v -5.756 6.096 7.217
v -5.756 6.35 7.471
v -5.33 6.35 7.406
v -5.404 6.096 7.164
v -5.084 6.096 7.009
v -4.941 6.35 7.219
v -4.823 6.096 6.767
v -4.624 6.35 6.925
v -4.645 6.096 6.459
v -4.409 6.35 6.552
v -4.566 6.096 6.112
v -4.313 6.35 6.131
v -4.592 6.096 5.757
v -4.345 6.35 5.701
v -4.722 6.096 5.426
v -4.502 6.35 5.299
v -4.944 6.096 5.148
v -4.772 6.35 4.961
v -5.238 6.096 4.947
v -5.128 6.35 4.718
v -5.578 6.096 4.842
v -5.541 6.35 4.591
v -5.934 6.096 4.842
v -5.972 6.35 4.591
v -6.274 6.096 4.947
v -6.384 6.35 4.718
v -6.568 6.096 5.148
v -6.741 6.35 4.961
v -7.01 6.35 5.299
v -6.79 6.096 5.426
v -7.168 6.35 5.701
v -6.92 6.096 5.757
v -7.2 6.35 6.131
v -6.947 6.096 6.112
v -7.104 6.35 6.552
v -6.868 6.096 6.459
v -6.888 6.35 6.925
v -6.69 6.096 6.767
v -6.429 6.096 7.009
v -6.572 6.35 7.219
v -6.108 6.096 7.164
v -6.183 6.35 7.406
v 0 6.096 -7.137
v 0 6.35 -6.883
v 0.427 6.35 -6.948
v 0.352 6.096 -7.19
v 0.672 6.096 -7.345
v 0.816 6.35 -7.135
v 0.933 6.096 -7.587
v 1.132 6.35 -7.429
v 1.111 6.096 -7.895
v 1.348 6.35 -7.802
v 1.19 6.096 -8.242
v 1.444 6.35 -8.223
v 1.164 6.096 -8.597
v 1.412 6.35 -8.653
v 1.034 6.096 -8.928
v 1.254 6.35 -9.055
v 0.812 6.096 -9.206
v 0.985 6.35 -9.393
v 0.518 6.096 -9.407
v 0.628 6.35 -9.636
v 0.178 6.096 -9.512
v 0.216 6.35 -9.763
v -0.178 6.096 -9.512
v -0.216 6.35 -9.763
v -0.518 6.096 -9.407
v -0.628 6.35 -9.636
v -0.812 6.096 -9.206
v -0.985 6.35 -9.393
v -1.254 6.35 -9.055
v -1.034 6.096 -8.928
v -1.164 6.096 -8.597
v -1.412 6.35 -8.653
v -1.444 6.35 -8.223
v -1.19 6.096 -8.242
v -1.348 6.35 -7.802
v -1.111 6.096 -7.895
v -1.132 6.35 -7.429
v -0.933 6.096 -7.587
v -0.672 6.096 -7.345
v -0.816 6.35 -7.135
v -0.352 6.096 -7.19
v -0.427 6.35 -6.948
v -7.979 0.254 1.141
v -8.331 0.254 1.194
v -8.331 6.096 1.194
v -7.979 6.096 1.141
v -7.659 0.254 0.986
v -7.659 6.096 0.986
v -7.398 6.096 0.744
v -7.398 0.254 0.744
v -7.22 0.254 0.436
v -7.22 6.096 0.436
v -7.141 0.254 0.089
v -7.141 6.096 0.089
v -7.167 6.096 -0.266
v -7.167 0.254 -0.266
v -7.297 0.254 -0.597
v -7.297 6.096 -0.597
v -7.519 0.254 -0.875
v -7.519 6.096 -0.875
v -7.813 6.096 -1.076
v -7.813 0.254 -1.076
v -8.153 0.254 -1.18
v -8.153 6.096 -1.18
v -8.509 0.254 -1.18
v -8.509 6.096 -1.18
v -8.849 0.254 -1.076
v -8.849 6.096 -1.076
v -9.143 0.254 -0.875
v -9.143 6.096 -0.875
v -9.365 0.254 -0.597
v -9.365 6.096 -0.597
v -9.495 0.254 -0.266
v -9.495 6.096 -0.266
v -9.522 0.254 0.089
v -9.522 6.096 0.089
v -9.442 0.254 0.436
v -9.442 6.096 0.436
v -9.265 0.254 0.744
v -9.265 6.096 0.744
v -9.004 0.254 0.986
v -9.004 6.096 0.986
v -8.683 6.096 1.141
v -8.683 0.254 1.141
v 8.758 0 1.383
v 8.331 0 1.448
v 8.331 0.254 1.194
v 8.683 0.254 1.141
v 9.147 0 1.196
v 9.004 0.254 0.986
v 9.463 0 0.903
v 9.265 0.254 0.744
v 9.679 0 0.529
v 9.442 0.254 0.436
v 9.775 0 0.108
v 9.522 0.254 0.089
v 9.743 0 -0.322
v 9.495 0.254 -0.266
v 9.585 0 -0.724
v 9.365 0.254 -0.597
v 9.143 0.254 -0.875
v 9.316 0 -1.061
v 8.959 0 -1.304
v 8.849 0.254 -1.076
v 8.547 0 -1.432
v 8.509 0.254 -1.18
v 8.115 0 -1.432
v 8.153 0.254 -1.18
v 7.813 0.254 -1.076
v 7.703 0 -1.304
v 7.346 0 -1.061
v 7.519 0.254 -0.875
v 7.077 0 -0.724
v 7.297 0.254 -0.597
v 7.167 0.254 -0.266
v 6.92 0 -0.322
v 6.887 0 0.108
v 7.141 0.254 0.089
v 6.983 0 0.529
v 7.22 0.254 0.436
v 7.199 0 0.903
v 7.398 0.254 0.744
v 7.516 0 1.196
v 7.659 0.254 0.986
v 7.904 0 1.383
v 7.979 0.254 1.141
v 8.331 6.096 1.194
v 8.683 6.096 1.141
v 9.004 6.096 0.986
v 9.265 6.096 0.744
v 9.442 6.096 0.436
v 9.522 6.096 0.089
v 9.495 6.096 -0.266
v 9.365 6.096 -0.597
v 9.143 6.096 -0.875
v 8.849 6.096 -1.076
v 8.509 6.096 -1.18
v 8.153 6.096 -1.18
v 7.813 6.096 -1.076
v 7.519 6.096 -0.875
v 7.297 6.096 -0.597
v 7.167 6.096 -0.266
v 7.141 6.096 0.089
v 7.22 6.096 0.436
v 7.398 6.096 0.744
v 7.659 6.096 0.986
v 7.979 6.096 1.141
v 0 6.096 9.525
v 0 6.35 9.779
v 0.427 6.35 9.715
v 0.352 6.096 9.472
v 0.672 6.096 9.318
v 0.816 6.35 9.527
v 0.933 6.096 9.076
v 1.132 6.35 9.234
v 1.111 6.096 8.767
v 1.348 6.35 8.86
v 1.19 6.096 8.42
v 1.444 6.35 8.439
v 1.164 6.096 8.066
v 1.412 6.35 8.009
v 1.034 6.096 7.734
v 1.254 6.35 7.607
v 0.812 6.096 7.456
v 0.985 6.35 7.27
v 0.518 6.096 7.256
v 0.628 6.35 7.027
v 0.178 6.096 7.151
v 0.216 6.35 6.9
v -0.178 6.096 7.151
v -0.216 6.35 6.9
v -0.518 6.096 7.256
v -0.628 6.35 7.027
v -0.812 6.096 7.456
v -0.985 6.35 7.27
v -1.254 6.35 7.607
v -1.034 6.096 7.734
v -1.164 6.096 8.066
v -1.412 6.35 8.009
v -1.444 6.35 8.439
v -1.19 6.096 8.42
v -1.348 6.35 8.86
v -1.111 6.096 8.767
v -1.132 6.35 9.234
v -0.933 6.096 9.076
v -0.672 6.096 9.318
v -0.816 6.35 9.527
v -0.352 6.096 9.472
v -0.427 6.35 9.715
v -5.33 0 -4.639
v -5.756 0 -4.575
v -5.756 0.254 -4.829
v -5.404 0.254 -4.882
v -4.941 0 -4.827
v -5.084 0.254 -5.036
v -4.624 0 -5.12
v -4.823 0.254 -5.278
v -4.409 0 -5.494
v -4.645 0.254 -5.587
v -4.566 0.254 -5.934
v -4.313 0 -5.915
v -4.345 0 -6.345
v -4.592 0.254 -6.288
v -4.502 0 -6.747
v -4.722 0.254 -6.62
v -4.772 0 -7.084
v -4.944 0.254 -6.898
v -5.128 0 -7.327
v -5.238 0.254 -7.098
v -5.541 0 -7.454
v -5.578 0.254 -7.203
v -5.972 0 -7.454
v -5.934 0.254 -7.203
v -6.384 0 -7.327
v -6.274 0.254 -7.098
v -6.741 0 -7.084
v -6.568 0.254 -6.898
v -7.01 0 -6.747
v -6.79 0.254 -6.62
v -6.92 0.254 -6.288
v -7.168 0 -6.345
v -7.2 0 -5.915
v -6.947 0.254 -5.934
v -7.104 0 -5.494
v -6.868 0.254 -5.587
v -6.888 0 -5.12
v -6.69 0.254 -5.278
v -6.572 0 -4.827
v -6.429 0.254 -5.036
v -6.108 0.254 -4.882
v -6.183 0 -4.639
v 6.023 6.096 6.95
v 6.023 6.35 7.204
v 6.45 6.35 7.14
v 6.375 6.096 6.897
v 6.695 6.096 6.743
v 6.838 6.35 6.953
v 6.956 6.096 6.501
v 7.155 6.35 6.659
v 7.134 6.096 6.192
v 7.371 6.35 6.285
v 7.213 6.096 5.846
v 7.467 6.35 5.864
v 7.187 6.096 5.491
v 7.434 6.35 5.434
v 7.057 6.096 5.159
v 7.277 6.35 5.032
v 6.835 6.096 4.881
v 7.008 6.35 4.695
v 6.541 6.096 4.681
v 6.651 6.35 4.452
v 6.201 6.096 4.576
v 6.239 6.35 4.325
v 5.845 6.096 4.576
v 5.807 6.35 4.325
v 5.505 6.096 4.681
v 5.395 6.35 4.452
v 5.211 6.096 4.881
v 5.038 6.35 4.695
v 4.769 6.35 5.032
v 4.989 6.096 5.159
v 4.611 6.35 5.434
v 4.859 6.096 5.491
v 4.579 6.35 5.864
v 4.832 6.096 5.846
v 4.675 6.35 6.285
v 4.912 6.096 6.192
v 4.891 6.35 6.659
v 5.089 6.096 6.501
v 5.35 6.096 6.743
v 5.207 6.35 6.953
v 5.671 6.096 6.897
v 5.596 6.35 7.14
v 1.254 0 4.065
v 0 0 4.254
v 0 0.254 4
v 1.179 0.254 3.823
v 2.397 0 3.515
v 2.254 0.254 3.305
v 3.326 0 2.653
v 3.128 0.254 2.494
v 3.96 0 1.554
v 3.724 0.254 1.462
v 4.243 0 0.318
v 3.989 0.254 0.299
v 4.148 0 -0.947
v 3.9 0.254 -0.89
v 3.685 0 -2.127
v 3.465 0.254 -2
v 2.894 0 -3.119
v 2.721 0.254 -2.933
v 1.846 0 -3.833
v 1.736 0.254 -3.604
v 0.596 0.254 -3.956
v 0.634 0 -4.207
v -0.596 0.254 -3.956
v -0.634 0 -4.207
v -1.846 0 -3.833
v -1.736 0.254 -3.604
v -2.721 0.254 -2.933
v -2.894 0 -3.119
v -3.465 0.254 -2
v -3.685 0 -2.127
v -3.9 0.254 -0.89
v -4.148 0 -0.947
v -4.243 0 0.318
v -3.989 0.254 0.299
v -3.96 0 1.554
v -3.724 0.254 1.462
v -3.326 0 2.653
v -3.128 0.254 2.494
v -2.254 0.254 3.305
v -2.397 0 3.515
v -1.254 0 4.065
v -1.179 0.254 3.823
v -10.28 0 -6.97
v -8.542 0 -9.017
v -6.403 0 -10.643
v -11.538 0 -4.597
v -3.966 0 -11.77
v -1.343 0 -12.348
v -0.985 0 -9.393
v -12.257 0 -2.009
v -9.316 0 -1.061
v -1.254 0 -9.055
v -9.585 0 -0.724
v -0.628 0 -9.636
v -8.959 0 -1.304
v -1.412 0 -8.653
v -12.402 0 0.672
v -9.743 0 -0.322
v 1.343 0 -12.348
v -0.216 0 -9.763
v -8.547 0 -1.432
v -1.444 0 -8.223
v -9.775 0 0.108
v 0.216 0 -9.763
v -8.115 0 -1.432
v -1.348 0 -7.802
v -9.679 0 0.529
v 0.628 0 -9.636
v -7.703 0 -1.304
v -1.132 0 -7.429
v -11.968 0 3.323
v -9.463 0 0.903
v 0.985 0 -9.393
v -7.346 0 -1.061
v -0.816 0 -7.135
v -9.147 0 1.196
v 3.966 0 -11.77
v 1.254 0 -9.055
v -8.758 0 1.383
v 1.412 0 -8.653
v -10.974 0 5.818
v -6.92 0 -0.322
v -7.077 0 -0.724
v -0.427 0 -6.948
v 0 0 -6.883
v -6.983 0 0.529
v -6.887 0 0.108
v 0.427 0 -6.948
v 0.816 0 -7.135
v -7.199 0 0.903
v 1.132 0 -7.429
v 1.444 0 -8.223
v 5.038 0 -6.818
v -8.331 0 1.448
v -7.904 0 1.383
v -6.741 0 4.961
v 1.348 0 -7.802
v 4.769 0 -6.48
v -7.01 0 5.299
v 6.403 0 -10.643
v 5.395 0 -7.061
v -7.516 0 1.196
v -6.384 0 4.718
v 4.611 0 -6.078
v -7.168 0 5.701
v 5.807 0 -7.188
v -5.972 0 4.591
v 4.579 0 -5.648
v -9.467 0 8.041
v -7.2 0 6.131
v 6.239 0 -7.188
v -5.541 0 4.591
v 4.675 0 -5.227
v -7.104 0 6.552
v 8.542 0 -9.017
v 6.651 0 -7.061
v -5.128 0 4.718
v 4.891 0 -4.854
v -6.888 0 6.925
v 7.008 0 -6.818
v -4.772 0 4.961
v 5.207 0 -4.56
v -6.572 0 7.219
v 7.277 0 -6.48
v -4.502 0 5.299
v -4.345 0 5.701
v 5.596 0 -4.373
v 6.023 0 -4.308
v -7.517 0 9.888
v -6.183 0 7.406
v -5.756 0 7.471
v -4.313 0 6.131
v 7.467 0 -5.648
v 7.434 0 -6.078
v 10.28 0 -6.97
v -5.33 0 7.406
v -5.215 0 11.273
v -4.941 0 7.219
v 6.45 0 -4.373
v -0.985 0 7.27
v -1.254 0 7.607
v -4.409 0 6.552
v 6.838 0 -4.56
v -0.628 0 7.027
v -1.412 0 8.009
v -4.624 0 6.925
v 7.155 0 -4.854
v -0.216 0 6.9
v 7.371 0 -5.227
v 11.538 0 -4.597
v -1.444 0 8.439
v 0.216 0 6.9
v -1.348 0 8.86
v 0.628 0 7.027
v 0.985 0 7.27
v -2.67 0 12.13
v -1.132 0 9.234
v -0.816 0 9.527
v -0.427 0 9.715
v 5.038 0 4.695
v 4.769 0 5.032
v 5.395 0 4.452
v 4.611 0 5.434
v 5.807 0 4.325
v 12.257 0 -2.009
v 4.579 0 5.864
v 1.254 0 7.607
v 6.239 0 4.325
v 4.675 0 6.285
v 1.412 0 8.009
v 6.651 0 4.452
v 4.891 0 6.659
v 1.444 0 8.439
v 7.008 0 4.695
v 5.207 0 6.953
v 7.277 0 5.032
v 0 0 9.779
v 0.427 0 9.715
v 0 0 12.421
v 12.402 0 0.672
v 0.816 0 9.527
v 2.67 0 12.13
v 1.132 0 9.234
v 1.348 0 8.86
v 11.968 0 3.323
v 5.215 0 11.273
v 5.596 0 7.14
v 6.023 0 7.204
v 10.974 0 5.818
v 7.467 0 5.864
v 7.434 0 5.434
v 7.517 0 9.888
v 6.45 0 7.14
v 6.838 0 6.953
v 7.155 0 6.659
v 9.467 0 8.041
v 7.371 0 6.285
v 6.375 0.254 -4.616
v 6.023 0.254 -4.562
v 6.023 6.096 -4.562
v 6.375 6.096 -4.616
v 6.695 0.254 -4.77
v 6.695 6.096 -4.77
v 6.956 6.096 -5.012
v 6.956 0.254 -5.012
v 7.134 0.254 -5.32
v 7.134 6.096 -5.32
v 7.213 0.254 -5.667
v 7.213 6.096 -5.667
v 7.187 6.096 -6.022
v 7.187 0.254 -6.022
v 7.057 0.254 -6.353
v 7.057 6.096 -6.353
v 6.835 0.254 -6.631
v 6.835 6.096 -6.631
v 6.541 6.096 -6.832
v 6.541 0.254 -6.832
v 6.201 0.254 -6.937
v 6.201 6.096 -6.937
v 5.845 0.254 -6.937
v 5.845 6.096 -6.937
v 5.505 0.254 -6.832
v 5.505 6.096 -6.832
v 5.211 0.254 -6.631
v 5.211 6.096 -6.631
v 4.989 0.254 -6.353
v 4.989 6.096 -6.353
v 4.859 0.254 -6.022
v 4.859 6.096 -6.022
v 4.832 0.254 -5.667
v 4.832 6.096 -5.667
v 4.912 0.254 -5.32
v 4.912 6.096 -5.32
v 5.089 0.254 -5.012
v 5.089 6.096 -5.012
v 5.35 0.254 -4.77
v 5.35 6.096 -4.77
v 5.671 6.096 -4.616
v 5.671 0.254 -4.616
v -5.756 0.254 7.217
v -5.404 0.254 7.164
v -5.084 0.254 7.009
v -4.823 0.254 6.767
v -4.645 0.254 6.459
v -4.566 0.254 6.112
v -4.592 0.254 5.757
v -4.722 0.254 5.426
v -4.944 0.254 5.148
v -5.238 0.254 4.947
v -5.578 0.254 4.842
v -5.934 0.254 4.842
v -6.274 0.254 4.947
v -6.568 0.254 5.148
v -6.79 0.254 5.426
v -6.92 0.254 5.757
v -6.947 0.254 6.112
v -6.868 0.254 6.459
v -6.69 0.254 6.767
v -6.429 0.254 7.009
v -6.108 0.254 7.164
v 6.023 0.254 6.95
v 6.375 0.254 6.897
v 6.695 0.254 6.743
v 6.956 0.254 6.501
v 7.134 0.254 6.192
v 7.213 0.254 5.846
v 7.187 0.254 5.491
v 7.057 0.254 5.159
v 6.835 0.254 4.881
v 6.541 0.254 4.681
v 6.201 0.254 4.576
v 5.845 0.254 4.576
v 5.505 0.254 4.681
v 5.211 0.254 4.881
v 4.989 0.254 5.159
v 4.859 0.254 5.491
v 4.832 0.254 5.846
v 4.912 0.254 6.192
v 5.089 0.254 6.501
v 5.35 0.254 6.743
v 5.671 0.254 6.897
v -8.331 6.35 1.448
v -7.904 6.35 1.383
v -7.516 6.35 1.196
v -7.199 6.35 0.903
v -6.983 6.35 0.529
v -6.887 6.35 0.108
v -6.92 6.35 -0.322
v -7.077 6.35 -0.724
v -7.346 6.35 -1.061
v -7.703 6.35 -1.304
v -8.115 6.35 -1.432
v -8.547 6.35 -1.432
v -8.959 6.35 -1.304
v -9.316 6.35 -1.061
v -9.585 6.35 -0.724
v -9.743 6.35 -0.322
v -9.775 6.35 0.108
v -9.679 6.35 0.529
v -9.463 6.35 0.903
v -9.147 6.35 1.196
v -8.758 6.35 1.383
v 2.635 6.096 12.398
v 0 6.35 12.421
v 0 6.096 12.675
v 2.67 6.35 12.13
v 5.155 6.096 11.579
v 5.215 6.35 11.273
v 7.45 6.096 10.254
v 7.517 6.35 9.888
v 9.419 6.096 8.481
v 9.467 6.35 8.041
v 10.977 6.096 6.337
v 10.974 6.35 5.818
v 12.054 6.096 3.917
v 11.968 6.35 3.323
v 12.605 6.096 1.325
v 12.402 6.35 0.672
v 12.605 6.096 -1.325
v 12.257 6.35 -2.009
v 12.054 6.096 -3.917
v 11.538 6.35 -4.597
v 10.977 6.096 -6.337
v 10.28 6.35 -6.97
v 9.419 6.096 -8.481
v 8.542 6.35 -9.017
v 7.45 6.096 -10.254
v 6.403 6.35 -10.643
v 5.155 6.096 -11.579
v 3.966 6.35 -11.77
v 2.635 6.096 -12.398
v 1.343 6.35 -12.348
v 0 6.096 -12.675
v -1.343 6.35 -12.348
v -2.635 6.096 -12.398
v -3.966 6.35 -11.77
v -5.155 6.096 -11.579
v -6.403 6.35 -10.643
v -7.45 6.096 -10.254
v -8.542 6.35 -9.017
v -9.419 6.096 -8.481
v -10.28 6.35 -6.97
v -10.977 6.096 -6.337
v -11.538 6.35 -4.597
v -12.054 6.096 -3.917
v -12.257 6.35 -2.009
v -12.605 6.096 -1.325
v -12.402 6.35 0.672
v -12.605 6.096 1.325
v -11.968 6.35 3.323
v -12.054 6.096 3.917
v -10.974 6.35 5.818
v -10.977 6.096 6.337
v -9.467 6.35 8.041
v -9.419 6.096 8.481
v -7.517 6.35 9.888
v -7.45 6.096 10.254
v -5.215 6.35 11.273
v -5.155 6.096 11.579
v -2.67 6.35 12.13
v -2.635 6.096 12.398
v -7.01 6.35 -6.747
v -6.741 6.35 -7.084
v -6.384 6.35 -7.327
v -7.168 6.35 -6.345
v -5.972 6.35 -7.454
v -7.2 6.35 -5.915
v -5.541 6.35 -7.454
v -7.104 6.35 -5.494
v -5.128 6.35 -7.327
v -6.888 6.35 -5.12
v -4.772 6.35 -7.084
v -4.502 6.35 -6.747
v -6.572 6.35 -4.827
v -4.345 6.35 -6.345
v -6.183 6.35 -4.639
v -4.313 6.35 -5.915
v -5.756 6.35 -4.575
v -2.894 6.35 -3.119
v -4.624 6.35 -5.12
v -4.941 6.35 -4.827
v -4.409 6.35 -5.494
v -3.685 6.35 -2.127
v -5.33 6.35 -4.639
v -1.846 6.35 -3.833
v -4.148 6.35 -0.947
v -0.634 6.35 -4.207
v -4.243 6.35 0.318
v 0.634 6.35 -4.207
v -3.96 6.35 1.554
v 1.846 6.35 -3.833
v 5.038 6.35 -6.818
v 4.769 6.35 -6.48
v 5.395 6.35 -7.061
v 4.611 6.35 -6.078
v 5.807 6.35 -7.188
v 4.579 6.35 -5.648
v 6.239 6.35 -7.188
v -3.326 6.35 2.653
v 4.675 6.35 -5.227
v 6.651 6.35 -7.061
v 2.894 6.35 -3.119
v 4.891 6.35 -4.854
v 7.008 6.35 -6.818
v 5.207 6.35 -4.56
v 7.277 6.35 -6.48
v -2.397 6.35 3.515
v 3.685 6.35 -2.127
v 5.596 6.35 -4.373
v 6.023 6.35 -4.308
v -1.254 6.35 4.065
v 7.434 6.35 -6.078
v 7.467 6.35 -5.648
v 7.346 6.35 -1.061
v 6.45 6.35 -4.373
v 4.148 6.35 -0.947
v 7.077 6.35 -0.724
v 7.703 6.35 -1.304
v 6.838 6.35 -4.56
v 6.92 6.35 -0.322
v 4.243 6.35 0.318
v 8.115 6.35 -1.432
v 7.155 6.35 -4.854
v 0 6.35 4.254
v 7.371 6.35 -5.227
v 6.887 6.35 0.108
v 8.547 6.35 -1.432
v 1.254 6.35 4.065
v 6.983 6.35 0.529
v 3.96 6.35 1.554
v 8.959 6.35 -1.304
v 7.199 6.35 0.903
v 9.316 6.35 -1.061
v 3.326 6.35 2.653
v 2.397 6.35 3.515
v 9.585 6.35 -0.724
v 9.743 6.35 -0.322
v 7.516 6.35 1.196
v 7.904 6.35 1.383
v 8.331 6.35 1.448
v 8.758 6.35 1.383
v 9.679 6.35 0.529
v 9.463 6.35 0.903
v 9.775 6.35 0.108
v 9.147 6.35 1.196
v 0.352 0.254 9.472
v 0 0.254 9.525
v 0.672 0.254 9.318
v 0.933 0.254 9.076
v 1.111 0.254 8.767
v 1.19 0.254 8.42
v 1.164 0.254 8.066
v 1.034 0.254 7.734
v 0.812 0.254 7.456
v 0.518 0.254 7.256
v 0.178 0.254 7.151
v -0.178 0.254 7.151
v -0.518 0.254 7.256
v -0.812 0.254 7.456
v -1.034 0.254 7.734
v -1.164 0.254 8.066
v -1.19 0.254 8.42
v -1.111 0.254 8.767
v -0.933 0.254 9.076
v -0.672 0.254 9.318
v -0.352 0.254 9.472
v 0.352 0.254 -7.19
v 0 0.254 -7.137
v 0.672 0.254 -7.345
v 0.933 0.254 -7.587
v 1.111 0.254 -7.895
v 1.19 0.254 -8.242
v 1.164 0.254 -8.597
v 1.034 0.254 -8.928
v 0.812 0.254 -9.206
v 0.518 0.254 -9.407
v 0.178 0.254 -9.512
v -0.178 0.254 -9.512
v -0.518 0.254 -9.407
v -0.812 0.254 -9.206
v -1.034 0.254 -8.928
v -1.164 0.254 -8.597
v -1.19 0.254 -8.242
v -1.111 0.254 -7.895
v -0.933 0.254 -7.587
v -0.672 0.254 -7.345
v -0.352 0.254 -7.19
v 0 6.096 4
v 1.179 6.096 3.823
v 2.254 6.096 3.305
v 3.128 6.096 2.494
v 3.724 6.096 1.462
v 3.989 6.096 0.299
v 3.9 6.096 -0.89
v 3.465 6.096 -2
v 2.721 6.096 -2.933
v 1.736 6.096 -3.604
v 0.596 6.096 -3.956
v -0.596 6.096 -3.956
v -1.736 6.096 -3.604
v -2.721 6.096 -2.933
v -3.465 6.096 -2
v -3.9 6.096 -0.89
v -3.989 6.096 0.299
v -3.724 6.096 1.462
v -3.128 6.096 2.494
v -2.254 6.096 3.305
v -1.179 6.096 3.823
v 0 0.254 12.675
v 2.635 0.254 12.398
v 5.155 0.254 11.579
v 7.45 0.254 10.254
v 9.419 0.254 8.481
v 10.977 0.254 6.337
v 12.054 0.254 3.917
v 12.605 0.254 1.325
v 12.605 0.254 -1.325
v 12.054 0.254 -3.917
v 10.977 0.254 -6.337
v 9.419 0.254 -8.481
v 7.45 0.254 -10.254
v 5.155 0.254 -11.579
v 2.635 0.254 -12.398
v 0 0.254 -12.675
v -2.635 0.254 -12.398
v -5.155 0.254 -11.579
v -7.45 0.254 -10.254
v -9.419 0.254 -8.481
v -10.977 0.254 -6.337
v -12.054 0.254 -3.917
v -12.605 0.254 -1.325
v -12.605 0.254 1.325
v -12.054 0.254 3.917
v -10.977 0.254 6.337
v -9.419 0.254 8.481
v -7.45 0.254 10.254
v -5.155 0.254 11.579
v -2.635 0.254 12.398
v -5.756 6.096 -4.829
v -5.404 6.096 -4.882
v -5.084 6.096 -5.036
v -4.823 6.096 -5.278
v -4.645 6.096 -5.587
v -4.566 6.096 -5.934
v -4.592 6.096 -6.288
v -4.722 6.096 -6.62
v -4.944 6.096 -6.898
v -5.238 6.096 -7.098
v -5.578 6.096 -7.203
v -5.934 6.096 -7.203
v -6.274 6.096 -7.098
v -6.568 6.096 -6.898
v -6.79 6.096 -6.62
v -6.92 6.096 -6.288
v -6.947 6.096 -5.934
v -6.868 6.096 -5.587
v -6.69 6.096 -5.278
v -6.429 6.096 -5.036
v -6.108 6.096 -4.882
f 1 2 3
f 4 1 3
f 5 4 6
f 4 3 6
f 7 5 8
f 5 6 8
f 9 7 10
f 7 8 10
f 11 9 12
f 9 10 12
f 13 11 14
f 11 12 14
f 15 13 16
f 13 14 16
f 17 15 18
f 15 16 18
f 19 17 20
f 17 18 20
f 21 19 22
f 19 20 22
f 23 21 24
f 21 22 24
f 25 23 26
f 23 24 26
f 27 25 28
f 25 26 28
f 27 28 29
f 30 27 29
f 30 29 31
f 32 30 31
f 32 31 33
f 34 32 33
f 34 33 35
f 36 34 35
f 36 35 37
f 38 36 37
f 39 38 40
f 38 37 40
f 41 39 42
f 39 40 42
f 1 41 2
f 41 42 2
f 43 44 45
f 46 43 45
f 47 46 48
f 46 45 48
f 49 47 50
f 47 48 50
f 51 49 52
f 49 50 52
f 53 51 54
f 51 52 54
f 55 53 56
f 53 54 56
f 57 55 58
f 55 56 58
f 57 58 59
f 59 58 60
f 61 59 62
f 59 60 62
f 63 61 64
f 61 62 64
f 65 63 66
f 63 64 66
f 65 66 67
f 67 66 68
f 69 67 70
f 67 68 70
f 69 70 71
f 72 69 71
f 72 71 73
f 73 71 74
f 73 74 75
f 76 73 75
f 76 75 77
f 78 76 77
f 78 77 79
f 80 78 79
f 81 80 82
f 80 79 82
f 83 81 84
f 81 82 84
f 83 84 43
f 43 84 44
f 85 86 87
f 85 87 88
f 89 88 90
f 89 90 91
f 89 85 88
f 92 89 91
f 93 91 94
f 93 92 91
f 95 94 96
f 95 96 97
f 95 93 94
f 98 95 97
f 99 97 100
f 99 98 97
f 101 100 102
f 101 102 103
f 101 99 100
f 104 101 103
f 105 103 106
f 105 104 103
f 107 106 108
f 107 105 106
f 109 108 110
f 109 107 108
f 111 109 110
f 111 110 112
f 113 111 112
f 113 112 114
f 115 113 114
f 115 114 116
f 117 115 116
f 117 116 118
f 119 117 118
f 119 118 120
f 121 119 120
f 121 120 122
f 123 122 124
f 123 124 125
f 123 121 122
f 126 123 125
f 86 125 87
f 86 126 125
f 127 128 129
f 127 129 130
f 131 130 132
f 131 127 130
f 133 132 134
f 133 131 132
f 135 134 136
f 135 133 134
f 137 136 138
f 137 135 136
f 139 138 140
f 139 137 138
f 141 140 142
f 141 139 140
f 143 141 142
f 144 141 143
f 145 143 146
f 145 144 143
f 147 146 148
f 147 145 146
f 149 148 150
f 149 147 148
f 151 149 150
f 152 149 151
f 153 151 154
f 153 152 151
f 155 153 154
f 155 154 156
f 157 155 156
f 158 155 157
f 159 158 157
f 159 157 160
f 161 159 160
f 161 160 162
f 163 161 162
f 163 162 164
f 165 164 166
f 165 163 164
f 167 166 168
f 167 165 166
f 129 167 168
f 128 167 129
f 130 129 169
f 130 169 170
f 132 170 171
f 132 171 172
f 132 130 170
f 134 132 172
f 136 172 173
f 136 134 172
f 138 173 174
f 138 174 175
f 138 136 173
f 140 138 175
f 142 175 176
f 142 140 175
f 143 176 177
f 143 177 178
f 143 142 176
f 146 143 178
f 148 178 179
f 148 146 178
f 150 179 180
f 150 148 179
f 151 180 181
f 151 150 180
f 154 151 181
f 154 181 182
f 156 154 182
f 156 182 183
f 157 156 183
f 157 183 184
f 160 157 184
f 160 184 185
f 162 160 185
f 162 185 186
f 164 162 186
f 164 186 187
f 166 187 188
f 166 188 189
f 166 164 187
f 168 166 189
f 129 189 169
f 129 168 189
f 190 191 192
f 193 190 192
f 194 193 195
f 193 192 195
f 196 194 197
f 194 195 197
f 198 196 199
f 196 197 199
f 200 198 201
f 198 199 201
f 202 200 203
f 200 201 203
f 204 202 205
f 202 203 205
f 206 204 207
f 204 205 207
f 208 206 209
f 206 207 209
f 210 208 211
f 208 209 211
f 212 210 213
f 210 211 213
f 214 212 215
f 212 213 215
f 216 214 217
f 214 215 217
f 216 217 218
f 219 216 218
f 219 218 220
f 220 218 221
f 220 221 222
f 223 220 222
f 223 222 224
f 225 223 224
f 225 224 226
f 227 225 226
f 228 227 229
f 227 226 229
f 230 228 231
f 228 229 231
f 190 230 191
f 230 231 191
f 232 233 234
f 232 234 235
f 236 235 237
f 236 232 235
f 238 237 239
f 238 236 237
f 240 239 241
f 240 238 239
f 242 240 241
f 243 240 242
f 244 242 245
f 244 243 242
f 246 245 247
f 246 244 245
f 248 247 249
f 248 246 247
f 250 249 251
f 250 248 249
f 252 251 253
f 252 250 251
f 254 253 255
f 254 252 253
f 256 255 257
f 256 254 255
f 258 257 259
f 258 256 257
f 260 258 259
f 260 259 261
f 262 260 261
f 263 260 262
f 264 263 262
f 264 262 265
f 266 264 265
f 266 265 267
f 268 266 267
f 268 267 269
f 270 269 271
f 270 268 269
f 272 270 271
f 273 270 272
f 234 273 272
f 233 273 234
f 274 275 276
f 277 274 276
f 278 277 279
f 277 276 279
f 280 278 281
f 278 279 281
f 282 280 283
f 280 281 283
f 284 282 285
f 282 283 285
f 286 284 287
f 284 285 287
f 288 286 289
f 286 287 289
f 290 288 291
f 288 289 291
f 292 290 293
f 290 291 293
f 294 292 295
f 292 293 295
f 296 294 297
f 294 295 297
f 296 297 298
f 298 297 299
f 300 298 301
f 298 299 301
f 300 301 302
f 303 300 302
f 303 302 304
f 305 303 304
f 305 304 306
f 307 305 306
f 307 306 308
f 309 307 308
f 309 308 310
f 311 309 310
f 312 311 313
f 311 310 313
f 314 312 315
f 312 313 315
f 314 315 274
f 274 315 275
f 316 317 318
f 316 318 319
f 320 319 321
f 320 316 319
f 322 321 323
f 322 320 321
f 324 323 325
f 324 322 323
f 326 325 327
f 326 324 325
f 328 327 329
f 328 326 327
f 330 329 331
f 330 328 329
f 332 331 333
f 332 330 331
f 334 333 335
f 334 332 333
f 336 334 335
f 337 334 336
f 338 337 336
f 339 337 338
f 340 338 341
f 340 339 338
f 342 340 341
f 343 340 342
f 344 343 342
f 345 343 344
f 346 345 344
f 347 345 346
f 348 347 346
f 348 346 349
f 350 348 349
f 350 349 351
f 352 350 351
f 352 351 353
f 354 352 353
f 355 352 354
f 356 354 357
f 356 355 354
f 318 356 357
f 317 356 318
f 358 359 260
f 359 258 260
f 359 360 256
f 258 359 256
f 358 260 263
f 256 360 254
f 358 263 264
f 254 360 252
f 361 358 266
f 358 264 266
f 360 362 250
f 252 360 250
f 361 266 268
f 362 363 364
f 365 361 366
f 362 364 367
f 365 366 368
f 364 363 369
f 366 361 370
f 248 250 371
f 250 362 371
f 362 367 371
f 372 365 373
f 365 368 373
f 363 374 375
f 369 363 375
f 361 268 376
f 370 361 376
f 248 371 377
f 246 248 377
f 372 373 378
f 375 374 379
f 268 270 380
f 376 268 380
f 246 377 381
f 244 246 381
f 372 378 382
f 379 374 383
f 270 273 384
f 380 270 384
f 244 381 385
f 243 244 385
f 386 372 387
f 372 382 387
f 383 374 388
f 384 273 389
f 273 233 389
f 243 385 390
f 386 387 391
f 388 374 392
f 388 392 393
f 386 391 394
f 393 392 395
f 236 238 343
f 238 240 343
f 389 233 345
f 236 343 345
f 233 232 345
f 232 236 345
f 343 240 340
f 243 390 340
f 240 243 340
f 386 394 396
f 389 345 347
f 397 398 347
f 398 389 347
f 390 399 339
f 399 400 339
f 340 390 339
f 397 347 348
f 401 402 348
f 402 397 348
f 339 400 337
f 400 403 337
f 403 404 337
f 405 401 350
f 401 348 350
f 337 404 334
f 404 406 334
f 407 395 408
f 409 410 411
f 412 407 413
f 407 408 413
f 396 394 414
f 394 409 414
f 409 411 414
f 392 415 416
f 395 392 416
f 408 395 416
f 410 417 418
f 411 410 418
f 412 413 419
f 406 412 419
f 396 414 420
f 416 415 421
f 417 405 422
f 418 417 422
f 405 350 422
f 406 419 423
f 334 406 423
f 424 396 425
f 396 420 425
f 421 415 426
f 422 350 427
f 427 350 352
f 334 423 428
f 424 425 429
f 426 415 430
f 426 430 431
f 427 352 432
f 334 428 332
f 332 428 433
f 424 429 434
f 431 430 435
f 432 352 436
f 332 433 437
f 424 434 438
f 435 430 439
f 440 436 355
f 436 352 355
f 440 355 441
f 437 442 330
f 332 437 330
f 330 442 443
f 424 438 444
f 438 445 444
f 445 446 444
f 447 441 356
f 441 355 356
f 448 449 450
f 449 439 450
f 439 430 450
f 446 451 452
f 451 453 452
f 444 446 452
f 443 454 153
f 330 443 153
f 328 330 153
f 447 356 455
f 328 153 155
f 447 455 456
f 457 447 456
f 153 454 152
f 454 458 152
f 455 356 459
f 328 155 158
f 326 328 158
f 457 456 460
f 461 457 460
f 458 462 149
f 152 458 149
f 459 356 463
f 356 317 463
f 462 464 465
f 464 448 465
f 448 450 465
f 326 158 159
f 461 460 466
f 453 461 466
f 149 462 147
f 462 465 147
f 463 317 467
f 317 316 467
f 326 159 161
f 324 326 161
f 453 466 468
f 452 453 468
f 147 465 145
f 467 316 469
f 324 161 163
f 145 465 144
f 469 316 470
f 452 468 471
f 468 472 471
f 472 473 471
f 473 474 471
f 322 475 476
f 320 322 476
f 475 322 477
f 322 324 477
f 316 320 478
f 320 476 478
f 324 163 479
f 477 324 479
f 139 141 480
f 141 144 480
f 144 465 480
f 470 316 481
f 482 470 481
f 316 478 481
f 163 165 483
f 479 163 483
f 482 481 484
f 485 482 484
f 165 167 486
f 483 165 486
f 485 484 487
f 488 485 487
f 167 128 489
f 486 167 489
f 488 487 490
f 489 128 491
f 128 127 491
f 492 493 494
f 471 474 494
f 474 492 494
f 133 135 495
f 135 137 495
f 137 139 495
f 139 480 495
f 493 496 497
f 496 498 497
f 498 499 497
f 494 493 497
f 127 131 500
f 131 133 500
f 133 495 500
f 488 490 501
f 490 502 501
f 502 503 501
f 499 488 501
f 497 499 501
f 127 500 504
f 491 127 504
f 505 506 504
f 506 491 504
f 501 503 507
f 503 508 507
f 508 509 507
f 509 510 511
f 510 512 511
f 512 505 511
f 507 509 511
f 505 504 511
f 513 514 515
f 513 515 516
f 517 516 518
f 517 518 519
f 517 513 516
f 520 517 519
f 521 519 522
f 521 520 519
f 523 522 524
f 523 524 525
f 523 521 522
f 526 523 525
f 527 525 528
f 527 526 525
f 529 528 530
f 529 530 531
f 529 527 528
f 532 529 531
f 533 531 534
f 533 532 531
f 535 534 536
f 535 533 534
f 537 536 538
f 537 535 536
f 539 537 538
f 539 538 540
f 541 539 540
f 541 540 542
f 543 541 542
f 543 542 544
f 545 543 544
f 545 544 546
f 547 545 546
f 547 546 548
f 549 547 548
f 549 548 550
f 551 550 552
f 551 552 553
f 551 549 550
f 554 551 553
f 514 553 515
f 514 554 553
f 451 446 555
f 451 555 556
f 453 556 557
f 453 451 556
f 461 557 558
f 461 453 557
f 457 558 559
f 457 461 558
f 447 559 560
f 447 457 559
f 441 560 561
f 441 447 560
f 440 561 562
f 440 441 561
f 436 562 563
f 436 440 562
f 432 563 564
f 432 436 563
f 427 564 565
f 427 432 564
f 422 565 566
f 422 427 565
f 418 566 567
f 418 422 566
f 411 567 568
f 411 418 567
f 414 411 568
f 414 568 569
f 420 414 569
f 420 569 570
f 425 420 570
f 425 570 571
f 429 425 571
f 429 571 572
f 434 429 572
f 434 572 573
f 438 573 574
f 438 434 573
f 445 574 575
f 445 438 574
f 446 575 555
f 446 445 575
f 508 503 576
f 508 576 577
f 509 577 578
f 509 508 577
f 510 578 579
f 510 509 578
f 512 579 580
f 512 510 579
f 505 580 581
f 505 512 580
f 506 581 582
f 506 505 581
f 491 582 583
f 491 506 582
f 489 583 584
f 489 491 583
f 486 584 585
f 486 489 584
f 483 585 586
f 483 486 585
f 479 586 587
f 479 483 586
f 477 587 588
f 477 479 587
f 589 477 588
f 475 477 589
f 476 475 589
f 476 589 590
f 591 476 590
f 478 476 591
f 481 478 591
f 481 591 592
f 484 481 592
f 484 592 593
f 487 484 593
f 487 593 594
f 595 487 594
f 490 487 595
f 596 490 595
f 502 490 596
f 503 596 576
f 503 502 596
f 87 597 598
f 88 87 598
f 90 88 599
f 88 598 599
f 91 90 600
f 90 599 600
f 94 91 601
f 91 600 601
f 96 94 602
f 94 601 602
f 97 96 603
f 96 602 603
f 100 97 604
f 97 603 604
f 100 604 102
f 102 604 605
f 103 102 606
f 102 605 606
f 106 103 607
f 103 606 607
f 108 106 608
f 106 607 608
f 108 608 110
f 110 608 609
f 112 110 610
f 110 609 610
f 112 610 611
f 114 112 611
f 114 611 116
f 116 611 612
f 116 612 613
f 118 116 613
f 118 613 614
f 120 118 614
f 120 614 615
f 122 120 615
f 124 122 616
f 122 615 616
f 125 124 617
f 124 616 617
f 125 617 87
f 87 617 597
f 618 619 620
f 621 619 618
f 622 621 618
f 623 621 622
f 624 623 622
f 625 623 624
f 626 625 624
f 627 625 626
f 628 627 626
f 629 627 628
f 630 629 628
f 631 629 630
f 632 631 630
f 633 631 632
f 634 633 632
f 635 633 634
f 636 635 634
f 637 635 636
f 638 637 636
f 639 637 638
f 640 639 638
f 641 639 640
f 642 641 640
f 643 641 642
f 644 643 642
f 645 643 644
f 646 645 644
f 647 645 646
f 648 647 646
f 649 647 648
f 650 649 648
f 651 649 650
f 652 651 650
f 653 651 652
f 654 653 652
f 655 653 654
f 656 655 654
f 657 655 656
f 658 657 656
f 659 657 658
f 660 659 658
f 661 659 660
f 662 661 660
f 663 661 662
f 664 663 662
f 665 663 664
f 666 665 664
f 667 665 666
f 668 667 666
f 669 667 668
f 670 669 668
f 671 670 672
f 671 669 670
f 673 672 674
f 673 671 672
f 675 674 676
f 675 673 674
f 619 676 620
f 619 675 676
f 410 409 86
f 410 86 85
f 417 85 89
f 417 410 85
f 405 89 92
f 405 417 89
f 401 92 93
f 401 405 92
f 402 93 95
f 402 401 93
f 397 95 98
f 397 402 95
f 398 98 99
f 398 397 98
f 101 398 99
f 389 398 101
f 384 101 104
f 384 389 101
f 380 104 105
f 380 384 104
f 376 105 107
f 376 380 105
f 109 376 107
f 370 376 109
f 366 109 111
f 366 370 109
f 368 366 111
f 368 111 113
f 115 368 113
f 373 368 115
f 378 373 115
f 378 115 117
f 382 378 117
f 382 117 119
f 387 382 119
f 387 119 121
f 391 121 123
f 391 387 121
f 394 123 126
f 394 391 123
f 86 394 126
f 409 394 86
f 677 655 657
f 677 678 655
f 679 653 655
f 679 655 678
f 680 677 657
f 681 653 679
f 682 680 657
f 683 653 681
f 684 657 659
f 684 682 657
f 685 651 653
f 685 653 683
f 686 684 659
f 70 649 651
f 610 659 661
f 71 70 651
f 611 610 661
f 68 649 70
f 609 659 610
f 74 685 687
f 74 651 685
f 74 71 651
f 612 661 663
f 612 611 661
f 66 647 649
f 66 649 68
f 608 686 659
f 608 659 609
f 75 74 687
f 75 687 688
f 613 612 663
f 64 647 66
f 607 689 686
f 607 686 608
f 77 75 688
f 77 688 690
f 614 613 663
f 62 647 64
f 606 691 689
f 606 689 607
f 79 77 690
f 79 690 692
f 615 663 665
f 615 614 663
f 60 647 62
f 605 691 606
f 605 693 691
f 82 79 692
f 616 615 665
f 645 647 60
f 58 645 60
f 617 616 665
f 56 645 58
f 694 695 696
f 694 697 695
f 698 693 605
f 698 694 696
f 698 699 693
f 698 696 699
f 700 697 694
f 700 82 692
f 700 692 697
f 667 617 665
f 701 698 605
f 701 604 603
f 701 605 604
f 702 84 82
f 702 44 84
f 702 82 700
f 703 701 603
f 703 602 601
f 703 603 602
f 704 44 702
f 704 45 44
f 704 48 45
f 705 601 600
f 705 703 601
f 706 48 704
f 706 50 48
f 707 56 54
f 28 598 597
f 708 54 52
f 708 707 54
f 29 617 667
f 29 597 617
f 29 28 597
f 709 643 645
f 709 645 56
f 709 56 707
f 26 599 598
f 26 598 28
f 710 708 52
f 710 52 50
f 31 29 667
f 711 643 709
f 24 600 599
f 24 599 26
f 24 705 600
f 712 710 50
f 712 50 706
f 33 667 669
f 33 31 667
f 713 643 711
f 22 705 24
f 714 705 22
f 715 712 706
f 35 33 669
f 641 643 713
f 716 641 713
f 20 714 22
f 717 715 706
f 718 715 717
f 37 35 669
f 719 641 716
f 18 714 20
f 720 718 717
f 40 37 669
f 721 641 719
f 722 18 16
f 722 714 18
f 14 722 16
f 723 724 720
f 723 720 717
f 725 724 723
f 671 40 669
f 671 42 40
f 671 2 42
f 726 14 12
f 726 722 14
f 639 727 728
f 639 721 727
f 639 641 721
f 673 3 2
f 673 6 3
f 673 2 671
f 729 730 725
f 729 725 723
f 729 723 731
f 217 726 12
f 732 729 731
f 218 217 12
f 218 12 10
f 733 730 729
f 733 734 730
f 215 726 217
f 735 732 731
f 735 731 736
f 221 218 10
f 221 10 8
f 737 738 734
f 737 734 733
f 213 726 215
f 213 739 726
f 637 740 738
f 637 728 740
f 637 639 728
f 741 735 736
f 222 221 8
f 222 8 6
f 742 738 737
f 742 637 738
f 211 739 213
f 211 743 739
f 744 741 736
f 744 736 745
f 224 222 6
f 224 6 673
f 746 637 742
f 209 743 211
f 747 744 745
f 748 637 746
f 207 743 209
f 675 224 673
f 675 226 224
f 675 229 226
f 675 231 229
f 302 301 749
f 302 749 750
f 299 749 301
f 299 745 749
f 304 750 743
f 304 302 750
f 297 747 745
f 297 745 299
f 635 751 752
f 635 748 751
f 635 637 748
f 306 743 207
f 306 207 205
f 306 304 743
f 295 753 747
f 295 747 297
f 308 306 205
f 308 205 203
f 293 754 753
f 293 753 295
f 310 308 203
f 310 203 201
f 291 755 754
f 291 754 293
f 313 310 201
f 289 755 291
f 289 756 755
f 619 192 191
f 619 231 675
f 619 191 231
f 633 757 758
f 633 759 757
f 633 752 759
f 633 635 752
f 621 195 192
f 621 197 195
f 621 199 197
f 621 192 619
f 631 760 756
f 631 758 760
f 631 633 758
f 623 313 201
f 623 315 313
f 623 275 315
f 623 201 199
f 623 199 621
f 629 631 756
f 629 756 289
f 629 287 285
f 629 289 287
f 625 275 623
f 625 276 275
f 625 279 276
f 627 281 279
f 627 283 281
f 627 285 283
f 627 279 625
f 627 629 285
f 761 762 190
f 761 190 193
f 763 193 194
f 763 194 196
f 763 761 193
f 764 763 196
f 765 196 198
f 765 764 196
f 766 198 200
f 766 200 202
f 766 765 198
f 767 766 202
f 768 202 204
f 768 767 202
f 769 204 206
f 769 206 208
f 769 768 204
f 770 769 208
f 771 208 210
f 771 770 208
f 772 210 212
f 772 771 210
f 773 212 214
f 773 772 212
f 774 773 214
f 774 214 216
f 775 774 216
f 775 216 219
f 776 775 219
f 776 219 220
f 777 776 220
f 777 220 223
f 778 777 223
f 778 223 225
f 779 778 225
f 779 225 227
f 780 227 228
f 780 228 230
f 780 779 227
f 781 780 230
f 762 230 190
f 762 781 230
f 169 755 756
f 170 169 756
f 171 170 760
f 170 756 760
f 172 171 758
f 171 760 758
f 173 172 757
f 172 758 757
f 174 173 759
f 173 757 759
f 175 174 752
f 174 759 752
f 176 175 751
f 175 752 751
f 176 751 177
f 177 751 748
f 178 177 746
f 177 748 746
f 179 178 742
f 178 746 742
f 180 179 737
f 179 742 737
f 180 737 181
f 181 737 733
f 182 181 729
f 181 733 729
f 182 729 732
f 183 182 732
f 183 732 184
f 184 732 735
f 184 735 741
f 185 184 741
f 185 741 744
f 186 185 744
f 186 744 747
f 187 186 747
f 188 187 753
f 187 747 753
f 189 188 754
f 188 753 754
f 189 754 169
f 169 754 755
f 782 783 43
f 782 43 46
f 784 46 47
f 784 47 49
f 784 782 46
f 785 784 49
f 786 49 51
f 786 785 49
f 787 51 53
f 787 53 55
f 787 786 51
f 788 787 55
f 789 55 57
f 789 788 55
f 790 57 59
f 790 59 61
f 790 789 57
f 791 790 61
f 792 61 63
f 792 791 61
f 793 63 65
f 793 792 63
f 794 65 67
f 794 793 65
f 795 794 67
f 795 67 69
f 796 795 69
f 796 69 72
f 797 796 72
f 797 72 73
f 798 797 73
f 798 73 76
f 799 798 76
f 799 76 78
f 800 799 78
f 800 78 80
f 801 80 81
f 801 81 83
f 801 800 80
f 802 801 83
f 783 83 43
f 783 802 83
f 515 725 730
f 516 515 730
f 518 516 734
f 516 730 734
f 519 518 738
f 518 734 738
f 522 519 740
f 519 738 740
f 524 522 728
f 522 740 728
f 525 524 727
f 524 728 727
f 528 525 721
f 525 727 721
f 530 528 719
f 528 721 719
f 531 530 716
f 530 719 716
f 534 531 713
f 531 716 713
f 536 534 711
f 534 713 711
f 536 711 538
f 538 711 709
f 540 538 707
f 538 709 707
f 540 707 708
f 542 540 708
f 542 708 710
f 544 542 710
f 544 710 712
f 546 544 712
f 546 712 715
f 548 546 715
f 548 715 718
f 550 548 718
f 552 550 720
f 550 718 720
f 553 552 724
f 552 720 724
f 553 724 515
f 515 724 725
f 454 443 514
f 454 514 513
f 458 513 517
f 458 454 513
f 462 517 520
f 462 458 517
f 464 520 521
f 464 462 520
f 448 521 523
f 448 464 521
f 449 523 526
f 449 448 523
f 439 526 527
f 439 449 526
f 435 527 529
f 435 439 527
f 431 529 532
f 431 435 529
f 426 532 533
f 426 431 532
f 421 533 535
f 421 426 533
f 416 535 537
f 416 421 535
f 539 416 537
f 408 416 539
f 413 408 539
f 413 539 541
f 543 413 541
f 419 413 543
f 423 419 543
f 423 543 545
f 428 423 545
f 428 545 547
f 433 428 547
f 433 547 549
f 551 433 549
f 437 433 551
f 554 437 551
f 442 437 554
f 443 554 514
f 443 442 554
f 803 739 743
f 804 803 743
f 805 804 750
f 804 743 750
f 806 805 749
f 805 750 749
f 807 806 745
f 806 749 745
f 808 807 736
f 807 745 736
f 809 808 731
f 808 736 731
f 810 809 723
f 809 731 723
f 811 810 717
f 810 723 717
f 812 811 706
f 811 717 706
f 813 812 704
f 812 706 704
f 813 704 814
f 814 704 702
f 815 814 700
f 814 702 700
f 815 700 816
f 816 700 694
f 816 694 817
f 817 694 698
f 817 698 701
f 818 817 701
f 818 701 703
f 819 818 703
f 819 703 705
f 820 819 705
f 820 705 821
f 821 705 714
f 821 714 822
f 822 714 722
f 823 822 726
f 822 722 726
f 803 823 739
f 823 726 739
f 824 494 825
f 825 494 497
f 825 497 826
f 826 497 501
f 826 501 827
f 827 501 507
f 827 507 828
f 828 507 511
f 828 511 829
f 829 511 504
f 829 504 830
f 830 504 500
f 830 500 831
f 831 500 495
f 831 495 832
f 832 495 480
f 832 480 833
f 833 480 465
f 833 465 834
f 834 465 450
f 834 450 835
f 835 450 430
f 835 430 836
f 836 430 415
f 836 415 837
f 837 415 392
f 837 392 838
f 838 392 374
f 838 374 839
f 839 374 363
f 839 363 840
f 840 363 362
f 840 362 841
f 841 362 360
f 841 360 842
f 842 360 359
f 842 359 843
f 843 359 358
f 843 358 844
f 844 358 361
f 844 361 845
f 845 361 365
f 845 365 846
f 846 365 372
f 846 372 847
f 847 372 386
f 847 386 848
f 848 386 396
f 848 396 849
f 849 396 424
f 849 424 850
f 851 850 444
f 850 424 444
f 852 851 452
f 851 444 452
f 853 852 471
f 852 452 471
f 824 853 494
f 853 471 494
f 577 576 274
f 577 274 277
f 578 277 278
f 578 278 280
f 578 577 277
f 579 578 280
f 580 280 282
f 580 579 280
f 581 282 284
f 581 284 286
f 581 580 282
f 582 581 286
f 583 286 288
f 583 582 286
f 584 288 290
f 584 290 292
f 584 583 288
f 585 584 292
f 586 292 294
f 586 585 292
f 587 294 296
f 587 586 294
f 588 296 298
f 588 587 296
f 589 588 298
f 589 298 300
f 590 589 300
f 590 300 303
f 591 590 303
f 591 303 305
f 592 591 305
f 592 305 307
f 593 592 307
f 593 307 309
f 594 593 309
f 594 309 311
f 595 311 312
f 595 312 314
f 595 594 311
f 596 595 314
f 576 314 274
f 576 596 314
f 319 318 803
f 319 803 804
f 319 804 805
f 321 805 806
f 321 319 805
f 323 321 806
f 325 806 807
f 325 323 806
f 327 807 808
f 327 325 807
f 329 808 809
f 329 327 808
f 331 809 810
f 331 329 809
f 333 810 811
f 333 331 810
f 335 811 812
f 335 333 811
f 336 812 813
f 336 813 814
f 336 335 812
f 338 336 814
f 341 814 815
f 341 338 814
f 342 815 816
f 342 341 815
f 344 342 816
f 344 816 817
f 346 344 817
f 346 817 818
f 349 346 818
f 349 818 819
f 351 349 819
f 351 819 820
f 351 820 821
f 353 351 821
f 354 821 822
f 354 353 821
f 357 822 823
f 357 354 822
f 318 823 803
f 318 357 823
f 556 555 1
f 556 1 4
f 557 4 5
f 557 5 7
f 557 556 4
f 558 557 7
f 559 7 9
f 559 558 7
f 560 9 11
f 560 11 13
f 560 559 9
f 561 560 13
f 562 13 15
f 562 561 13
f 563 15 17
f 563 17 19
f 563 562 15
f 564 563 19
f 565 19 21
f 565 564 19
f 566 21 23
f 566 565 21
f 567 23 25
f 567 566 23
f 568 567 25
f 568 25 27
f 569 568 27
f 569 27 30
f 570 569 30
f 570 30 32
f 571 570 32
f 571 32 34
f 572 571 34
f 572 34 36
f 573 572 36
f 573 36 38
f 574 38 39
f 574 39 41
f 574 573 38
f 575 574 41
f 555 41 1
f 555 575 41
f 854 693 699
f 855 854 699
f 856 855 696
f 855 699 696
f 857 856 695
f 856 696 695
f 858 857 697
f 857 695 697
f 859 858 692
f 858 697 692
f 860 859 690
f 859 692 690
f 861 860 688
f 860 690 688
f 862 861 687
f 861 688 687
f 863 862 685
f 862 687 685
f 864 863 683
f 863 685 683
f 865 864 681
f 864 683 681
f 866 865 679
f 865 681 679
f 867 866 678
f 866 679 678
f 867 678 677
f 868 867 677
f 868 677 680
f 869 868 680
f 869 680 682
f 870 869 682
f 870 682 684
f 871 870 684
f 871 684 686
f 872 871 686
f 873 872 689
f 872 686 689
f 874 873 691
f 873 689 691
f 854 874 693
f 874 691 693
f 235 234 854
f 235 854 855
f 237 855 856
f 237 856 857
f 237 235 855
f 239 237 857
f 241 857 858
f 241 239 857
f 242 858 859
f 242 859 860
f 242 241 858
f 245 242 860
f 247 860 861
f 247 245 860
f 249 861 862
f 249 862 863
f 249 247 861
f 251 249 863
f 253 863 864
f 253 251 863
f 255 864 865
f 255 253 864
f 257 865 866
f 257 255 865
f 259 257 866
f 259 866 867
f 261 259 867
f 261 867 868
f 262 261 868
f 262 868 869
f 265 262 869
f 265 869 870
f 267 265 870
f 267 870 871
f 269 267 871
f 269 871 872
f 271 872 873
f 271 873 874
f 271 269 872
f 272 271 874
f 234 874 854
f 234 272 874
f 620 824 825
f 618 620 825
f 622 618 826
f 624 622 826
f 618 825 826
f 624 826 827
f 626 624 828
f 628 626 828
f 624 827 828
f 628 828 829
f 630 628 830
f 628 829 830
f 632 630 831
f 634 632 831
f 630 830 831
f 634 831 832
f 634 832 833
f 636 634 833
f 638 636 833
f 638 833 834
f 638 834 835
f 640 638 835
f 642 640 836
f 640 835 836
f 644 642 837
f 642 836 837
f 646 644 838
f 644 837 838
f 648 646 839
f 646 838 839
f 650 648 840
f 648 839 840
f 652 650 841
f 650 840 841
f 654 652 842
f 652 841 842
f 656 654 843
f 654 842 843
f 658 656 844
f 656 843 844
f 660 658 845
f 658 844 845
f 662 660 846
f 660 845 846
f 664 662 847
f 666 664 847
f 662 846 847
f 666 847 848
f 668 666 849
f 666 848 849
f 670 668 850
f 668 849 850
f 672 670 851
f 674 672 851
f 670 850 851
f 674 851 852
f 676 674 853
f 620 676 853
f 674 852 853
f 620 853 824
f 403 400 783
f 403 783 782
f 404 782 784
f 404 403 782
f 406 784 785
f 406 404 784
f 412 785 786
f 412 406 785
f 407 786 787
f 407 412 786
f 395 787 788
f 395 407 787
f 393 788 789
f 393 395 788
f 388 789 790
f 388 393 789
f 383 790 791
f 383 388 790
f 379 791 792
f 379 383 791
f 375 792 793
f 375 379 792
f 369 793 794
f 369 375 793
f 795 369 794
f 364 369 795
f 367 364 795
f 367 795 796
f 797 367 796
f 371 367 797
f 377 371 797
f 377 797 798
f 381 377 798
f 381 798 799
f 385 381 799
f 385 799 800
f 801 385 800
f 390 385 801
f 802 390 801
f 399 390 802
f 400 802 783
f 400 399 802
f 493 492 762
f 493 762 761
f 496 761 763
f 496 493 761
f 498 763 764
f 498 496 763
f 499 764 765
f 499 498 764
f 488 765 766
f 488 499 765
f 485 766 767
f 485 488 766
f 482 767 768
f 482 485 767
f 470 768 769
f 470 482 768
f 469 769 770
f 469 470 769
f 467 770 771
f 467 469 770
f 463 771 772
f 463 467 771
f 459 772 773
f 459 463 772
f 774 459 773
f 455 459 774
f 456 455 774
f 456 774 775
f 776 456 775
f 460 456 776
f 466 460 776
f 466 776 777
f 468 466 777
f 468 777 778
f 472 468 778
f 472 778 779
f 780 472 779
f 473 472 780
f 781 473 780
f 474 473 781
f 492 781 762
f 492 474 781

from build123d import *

# Parameters (mm, degrees)
SKETCH1_R           = 12.6746
SKETCH1_R_2         = 4.0005
SKETCH1_R_3         = 1.1938
BOSS_EXTRUDE1_DEPTH = 6.35
CHAMFER1_SIZE       = 0.254


with BuildPart() as part:
    # Sketch1 → Boss-Extrude1 (new body)
    with BuildSketch(Plane(origin=(0, 0, 0), x_dir=(1, 0, 0), z_dir=(0, 1, 0))):
        with Locations(Location((0, 0, 0), (0, 0, 270))):
            Circle(SKETCH1_R)
        with Locations(Location((0, 0, 0), (0, 0, 270))):
            Circle(SKETCH1_R_2, mode=Mode.SUBTRACT)
        with Locations(Location((0, 8.3312, 0), (0, 0, 270))):
            Circle(SKETCH1_R_3, mode=Mode.SUBTRACT)
        with Locations(Location((8.3312, 0, 0), (0, 0, 270))):
            Circle(SKETCH1_R_3, mode=Mode.SUBTRACT)
        with Locations(Location((0, -8.3312, 0), (0, 0, 270))):
            Circle(SKETCH1_R_3, mode=Mode.SUBTRACT)
        with Locations(Location((-8.3312, 0, 0), (0, 0, 270))):
            Circle(SKETCH1_R_3, mode=Mode.SUBTRACT)
        with Locations(Location((-5.756293352, 6.022788415, 0), (0, 0, 270))):
            Circle(SKETCH1_R_3, mode=Mode.SUBTRACT)
        with Locations(Location((6.022788415, 5.756293352, 0), (0, 0, 270))):
            Circle(SKETCH1_R_3, mode=Mode.SUBTRACT)
        with Locations(Location((6.022788415, -5.756293352, 0), (0, 0, 270))):
            Circle(SKETCH1_R_3, mode=Mode.SUBTRACT)
        with Locations(Location((-5.756293352, -6.022788415, 0), (0, 0, 270))):
            Circle(SKETCH1_R_3, mode=Mode.SUBTRACT)
    extrude(amount=BOSS_EXTRUDE1_DEPTH)

    # Chamfer1
    chamfer1_edges = [part.edges().sort_by_distance(p)[0] for p in [
        (8.3312, 0, -1.1938),
        (8.3312, 6.35, -1.1938),
        (0, 0, 7.1374),
        (0, 6.35, 7.1374),
        (0, 0, -12.6746),
        (-8.3312, 0, -1.1938),
        (-8.3312, 6.35, -1.1938),
        (-5.756293352, 0, -7.216588415),
        (-5.756293352, 6.35, -7.216588415),
        (6.022788415, 0, -6.950093352),
        (6.022788415, 6.35, -6.950093352),
        (6.022788415, 0, 4.562493352),
        (6.022788415, 6.35, 4.562493352),
        (-5.756293352, 0, 4.828988415),
        (-5.756293352, 6.35, 4.828988415),
        (0, 6.35, -12.6746),
        (0, 0, -4.0005),
        (0, 6.35, -4.0005),
        (0, 0, -9.525),
        (0, 6.35, -9.525),
    ]]
    chamfer(chamfer1_edges, length=CHAMFER1_SIZE)


solid = part.part
